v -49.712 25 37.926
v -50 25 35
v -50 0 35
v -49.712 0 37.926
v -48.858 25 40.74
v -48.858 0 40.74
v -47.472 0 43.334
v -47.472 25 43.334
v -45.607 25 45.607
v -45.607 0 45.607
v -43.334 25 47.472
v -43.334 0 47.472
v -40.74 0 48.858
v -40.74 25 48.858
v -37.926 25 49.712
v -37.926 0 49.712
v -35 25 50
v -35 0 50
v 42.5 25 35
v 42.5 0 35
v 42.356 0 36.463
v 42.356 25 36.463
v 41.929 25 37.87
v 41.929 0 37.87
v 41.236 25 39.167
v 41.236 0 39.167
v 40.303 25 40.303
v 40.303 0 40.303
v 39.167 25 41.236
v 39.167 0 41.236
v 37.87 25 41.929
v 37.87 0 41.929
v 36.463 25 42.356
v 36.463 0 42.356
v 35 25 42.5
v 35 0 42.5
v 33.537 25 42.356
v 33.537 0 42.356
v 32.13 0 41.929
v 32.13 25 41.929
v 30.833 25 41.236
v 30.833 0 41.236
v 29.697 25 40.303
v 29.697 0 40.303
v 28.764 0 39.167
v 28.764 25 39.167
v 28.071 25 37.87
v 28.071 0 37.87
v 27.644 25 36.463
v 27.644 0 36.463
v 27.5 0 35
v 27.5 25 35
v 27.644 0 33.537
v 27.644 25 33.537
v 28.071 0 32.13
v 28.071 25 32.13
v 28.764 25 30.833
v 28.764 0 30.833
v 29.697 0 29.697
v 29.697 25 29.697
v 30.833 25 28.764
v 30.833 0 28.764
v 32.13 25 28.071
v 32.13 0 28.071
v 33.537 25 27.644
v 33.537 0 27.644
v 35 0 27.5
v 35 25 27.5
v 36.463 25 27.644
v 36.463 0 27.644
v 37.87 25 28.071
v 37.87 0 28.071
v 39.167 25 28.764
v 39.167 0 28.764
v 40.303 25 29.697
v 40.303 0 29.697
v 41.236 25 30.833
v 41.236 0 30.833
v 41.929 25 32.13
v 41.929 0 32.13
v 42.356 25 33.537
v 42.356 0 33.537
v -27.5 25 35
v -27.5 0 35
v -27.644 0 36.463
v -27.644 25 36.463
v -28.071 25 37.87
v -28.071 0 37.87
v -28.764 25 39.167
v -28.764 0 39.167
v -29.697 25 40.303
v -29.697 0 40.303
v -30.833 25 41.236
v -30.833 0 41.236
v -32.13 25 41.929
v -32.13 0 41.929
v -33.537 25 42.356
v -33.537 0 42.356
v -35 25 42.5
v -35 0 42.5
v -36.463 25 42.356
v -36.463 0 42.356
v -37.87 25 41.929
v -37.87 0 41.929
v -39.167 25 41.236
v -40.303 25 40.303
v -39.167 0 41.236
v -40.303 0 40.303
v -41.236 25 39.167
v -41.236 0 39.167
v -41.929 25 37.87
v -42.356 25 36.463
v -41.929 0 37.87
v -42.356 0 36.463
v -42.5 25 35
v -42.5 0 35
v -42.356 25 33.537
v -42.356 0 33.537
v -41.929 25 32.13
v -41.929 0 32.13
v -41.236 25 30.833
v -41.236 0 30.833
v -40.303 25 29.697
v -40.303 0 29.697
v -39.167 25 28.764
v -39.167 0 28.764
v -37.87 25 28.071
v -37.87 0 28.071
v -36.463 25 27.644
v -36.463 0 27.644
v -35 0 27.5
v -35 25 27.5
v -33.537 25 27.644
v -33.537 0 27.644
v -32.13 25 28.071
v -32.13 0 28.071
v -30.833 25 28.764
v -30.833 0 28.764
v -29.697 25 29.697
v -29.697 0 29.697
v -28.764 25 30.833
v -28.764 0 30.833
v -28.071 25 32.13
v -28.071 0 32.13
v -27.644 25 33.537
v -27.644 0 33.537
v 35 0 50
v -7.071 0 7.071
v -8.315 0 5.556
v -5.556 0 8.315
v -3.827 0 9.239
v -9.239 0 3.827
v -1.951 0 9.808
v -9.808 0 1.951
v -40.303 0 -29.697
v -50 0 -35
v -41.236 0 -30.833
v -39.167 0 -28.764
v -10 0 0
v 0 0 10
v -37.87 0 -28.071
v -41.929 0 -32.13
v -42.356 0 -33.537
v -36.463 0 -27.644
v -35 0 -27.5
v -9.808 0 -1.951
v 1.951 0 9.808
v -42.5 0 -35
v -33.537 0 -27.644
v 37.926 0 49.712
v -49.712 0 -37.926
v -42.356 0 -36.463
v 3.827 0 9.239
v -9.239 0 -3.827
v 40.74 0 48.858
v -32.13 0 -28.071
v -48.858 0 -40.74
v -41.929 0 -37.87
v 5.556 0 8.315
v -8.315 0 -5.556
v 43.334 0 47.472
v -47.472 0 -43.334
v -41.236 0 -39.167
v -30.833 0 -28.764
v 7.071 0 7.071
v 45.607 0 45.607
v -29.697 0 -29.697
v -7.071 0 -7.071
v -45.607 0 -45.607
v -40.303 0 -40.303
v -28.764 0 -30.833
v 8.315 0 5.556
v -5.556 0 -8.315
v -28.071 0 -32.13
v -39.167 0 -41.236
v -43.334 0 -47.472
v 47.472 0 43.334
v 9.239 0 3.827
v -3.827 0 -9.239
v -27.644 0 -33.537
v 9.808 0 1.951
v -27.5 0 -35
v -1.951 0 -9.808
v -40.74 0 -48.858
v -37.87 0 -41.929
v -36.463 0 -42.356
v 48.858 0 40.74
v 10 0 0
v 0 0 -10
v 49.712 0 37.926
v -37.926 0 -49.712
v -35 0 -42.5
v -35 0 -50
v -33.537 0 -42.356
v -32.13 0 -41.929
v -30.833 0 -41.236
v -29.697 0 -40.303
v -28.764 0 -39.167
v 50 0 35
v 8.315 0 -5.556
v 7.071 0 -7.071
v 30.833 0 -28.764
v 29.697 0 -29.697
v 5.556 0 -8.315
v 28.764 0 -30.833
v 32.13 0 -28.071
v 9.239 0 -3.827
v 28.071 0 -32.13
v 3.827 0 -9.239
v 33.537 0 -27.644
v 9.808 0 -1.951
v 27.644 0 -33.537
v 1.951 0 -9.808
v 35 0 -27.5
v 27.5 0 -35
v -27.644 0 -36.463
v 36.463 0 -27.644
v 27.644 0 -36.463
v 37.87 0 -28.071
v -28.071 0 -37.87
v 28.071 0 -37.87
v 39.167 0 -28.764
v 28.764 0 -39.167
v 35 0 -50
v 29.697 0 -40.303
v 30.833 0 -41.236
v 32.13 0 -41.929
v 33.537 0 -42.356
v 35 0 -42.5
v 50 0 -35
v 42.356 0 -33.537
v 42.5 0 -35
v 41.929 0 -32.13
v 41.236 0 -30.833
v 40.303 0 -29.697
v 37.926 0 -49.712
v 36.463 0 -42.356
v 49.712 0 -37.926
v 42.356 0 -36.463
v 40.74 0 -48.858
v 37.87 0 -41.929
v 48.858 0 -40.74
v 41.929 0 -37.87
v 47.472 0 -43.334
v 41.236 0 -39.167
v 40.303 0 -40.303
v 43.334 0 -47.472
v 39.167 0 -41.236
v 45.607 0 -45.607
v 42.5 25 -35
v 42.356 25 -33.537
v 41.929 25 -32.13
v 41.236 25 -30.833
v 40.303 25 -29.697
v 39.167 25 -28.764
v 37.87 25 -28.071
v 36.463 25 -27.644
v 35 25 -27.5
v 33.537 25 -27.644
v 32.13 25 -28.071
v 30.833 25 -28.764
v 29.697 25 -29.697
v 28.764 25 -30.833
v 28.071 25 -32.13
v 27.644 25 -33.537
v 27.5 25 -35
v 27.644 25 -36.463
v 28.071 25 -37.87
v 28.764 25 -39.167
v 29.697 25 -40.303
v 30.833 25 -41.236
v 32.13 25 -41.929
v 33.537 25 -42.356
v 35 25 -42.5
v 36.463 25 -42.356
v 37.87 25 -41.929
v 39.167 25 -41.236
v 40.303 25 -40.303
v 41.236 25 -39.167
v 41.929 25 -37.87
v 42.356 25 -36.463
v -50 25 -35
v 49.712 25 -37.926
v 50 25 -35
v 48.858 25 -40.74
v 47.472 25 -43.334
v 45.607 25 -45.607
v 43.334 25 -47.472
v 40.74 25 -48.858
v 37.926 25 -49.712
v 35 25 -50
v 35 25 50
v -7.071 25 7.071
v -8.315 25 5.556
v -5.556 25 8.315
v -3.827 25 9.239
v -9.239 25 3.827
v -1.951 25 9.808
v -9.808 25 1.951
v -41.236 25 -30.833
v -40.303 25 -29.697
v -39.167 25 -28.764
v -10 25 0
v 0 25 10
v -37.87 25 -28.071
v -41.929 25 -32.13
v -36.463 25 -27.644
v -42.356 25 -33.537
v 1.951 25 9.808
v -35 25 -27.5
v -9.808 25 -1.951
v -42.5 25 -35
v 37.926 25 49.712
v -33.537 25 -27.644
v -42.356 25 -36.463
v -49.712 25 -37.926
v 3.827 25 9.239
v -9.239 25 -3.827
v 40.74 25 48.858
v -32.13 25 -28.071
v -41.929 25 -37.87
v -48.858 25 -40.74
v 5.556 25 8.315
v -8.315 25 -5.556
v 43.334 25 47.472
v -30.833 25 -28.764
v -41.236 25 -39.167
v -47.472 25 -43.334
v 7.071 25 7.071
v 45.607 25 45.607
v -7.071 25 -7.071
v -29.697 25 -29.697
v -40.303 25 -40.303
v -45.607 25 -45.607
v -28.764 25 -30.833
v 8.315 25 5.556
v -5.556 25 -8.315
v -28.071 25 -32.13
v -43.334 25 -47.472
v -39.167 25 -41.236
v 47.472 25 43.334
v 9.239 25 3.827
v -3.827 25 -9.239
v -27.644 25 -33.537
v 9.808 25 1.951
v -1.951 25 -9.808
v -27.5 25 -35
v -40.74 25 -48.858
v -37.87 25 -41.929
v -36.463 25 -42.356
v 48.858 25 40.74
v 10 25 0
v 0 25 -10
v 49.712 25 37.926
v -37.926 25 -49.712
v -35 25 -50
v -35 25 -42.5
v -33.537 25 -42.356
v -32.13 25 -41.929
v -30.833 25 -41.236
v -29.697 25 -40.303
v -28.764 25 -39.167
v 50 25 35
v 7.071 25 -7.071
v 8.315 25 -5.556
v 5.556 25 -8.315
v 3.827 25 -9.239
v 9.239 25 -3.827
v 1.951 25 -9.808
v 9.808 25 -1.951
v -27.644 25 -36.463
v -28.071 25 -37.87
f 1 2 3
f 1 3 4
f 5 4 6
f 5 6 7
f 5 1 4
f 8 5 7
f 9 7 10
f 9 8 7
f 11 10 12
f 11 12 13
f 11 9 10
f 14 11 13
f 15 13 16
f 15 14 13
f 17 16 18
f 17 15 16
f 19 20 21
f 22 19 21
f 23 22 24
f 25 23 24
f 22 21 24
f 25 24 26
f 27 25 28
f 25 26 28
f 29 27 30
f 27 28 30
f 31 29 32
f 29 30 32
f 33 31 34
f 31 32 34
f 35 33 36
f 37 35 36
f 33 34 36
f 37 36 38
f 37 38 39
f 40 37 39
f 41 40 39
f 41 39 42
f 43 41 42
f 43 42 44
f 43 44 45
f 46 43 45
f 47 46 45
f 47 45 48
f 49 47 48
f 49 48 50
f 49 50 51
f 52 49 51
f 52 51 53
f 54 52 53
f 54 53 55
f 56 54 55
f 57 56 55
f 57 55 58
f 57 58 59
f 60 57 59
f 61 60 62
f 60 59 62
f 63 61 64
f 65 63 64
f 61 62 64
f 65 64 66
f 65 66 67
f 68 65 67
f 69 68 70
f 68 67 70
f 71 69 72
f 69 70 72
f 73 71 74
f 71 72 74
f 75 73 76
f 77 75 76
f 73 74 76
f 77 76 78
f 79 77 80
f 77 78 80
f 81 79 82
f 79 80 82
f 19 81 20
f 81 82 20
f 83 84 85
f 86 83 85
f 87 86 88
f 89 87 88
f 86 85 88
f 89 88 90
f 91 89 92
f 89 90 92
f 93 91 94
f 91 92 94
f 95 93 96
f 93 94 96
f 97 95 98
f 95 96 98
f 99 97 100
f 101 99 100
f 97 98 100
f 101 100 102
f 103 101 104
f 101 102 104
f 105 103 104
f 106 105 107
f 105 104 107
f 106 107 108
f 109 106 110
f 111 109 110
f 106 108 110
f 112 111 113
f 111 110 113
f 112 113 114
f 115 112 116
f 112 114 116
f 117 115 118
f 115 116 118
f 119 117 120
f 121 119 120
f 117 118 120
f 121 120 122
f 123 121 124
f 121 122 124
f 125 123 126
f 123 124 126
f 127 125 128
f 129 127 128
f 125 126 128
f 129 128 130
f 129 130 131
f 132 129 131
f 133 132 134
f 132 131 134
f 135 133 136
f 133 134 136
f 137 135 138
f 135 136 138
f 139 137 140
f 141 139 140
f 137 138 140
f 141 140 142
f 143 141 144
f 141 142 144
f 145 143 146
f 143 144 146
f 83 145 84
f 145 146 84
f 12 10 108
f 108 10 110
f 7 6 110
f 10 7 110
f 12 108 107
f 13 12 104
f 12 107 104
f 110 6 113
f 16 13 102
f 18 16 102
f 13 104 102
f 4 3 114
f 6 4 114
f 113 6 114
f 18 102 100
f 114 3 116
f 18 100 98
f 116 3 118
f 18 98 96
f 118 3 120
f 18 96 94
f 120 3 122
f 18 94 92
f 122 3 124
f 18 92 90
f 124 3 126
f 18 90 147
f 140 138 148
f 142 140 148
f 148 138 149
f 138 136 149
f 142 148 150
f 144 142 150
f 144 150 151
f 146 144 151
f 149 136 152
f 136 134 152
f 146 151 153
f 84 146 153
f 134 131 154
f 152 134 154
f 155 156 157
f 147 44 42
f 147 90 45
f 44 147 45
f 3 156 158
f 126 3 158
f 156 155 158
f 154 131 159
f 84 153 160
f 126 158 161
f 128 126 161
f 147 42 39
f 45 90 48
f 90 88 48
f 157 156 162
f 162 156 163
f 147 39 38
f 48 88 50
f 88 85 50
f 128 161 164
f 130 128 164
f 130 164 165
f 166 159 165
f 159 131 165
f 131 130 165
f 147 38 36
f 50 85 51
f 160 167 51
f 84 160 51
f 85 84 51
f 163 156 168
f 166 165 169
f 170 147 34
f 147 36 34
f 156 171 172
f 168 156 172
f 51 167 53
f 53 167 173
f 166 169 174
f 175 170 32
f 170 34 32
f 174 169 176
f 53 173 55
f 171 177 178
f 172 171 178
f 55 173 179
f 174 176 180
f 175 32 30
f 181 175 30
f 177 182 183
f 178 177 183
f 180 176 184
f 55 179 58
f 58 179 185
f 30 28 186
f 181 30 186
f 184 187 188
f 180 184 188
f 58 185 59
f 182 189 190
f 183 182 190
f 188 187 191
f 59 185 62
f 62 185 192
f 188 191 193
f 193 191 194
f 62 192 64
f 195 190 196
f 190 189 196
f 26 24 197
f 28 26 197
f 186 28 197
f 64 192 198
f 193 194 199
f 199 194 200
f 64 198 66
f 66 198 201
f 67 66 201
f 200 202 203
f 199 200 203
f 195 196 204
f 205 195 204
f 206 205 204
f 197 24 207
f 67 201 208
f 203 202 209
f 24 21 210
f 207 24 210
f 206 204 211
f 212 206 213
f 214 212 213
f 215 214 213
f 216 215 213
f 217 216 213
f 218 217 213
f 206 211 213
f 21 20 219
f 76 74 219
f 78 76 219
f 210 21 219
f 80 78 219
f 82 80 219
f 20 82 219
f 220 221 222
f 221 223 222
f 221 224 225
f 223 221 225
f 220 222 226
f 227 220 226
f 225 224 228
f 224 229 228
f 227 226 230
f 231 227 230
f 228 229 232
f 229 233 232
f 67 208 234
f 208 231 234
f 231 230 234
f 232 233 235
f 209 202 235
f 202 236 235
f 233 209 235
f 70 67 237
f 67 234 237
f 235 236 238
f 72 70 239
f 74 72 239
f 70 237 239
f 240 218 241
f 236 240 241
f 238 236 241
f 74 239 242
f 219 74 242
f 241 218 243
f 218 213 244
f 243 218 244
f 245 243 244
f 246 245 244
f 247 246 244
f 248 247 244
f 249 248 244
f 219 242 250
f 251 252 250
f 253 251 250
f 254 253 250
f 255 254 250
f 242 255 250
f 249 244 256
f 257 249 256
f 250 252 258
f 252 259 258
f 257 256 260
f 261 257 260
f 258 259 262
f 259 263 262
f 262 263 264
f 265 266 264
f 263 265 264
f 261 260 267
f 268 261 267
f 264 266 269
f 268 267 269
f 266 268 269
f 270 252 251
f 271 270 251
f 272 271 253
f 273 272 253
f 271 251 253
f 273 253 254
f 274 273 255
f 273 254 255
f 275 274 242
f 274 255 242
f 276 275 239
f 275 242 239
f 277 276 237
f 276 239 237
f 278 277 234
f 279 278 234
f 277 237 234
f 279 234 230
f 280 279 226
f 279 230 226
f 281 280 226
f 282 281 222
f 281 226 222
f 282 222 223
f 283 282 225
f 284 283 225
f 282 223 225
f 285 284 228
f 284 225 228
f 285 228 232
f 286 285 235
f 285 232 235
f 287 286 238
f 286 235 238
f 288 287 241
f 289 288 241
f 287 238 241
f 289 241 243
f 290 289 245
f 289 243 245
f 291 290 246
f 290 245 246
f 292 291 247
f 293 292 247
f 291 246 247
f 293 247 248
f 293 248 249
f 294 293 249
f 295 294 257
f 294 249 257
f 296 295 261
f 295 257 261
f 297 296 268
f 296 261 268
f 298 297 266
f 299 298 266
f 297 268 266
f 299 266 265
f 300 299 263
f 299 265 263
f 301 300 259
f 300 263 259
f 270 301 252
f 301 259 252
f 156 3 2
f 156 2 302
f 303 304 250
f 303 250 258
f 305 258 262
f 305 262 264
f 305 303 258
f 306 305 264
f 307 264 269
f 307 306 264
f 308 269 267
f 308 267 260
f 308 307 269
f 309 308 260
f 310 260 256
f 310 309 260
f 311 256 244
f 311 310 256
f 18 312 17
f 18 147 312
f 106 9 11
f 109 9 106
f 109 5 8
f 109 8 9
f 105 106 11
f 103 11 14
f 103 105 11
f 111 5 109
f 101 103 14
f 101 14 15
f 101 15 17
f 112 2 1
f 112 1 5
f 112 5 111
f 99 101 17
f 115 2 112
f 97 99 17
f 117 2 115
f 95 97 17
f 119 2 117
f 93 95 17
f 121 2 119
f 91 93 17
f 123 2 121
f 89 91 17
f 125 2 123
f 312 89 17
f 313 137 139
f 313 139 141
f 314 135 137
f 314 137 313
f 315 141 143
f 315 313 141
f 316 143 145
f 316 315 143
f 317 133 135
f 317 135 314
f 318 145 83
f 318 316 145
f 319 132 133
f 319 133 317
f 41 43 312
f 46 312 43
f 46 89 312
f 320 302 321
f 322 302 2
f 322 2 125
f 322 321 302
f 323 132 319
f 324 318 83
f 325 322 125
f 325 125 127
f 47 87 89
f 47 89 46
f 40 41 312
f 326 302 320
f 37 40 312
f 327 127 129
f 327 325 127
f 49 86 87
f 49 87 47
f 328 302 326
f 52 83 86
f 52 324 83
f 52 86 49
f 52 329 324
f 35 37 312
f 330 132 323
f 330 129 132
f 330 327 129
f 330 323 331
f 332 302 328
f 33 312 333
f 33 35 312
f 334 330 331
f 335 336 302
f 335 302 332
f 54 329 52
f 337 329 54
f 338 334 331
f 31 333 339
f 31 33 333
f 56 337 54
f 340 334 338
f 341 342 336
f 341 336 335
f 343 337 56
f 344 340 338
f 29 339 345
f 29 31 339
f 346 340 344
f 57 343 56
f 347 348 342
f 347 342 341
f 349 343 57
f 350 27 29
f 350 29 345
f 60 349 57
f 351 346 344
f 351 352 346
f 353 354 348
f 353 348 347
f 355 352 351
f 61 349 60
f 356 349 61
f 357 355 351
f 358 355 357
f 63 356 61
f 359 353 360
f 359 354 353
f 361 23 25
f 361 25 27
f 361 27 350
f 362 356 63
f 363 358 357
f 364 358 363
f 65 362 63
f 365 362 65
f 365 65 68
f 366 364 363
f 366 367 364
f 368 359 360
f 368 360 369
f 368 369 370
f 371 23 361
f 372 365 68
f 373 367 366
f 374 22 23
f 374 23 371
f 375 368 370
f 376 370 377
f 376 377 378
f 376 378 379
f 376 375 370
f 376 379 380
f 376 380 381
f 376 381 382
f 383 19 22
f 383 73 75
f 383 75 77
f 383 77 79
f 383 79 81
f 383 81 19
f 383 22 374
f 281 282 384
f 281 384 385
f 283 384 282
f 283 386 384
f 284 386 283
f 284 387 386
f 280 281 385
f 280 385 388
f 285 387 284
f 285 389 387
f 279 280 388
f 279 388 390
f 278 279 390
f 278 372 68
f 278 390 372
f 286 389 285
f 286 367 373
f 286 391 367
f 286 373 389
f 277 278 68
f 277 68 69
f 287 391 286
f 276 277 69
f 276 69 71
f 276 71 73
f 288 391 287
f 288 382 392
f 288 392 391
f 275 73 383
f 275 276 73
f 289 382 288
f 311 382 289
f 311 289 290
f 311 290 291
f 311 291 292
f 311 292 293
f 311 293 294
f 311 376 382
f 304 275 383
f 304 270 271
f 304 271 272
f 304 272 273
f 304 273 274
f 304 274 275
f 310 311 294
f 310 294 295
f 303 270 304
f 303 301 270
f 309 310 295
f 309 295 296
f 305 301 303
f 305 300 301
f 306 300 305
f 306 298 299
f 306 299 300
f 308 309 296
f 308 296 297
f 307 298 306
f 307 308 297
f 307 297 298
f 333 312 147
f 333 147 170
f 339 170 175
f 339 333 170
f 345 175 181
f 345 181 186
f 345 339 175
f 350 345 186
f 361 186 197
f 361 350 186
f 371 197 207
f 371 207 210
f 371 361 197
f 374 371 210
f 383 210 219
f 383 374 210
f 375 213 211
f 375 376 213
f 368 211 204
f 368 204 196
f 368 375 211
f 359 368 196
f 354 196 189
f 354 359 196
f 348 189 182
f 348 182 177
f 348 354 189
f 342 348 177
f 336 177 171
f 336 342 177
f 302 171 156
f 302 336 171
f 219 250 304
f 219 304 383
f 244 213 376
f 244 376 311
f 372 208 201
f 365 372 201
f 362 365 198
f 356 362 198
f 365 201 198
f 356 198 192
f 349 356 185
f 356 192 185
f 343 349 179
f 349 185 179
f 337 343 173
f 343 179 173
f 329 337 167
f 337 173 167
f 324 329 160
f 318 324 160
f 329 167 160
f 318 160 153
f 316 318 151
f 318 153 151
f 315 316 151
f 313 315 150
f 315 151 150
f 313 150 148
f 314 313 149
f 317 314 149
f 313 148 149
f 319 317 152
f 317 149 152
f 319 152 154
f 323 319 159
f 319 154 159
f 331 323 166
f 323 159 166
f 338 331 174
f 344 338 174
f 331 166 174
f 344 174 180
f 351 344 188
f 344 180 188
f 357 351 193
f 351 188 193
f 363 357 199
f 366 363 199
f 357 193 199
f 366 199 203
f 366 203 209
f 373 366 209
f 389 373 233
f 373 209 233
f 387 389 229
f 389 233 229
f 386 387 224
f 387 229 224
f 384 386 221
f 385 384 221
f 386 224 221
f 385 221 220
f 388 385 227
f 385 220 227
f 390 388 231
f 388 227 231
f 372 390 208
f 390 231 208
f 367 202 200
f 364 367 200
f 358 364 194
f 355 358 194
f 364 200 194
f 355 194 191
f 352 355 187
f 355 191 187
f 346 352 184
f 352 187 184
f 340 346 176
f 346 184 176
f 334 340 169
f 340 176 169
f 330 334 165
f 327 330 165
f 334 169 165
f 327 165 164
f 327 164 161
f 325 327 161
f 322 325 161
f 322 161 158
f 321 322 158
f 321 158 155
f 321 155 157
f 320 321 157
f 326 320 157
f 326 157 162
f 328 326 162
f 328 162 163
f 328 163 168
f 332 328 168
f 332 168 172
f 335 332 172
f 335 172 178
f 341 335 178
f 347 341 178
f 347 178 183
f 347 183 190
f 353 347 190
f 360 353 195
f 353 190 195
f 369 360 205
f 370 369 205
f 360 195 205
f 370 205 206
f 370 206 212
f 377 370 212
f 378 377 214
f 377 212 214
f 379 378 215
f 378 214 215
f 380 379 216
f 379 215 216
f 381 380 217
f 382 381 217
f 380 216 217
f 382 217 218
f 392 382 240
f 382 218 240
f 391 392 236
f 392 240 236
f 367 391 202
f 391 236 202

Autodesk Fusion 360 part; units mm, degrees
sketch "Sketch1" plane through (0, 0, 0) normal (0, 1, 0) x (1, 0, 0)
  line L0 (50, -50) -> (-50, -50)
  line L1 (-50, -50) -> (-50, 50)
  line L2 (-50, 50) -> (50, 50)
  line L3 (50, 50) -> (50, -50)
  line L4 (50, -50) -> (-50, 50) construction
  line L5 (-50, -50) -> (50, 50) construction
  circle A0 centre (-35, 35) radius 7.5
  circle A1 centre (-35, -35) radius 7.5
  circle A2 centre (35, -35) radius 7.5
  circle A3 centre (35, 35) radius 7.5
  circle A4 centre (0, 0) radius 25
  dimension "d1" = 100
  dimension "d2" = 100
  dimension "d3" = 15
  dimension "d4" = 15
  dimension "d5" = 50
extrude "Extrude1" add sketch "Sketch1" along normal blind 25
fillet "Fillet1" radius 15 4 edges at (-50, 12.5, 50) (-50, 12.5, -50) (50, 12.5, 50) (50, 12.5, -50)
fillet "Fillet2" radius 12.5 1 edges at (-23.3082, 25, -9.0404)
chamfer "Chamfer1" distance 5 angle 45 8 edges at (-45.6066, 25, 45.6066) (0, 25, 50) (45.6066, 25, 45.6066) (50, 25, 0) (45.6066, 25, -45.6066) (0, 25, -50) (-45.6066, 25, -45.6066) (-50, 25, 0)
delete_face "DeleteFace1" 1 faces at (36.8593, 24.9858, 1.8396)
delete_face "DeleteFace2" 8 faces at (36.0894, 22.5, -47.4524) (-11.6667, 21.6667, -48.3333) (48.3333, 21.6667, -11.6667) (47.4524, 22.5, 36.0894) (11.6667, 21.6667, 48.3333) (-36.0894, 22.5, 47.4524) (-48.3333, 21.6667, 11.6667) (-47.4524, 22.5, -36.0894)
move_face "OffsetFaces1" offset 15 1 faces at (24.8758, 16.6667, -2.4892)
